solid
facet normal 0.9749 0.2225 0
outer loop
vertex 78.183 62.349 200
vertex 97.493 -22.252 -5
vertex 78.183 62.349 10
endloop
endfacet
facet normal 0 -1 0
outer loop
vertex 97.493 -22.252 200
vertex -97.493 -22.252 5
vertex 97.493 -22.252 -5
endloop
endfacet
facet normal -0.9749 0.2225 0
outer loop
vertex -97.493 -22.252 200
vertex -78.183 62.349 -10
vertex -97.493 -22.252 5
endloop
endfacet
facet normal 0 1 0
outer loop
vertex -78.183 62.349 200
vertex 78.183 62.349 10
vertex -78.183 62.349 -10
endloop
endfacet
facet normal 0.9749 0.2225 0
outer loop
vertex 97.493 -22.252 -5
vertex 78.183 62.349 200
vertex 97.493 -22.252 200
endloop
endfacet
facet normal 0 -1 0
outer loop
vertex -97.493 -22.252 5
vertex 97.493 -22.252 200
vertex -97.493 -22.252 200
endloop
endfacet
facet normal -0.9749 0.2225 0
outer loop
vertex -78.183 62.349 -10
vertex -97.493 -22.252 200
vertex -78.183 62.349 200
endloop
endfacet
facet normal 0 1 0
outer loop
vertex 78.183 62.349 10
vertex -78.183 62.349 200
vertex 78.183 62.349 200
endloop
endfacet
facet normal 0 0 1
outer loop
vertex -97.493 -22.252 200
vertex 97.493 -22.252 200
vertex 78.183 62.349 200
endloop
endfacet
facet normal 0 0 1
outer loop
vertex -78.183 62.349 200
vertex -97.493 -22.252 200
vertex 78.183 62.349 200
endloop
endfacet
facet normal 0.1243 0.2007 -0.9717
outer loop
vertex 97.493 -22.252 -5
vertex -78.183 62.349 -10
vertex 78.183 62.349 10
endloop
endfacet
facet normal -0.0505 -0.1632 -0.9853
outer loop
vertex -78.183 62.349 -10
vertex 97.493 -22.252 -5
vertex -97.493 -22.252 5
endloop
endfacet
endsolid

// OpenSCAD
polyhedron(points = [
[78.1831, 62.349, 10],
[97.4928, -22.2521, -5],
[-97.4928, -22.2521, 5],
[-78.1831, 62.349, -10],
[78.1831, 62.349, 200],
[97.4928, -22.2521, 200],
[-97.4928, -22.2521, 200],
[-78.1831, 62.349, 200]
],
faces = [
[0, 1, 4],
[1, 2, 5],
[2, 3, 6],
[3, 0, 7],
[5, 4, 1],
[6, 5, 2],
[7, 6, 3],
[4, 7, 0],
[4, 5, 6],
[4, 6, 7],

[3, 2, 1, 0],

]);
